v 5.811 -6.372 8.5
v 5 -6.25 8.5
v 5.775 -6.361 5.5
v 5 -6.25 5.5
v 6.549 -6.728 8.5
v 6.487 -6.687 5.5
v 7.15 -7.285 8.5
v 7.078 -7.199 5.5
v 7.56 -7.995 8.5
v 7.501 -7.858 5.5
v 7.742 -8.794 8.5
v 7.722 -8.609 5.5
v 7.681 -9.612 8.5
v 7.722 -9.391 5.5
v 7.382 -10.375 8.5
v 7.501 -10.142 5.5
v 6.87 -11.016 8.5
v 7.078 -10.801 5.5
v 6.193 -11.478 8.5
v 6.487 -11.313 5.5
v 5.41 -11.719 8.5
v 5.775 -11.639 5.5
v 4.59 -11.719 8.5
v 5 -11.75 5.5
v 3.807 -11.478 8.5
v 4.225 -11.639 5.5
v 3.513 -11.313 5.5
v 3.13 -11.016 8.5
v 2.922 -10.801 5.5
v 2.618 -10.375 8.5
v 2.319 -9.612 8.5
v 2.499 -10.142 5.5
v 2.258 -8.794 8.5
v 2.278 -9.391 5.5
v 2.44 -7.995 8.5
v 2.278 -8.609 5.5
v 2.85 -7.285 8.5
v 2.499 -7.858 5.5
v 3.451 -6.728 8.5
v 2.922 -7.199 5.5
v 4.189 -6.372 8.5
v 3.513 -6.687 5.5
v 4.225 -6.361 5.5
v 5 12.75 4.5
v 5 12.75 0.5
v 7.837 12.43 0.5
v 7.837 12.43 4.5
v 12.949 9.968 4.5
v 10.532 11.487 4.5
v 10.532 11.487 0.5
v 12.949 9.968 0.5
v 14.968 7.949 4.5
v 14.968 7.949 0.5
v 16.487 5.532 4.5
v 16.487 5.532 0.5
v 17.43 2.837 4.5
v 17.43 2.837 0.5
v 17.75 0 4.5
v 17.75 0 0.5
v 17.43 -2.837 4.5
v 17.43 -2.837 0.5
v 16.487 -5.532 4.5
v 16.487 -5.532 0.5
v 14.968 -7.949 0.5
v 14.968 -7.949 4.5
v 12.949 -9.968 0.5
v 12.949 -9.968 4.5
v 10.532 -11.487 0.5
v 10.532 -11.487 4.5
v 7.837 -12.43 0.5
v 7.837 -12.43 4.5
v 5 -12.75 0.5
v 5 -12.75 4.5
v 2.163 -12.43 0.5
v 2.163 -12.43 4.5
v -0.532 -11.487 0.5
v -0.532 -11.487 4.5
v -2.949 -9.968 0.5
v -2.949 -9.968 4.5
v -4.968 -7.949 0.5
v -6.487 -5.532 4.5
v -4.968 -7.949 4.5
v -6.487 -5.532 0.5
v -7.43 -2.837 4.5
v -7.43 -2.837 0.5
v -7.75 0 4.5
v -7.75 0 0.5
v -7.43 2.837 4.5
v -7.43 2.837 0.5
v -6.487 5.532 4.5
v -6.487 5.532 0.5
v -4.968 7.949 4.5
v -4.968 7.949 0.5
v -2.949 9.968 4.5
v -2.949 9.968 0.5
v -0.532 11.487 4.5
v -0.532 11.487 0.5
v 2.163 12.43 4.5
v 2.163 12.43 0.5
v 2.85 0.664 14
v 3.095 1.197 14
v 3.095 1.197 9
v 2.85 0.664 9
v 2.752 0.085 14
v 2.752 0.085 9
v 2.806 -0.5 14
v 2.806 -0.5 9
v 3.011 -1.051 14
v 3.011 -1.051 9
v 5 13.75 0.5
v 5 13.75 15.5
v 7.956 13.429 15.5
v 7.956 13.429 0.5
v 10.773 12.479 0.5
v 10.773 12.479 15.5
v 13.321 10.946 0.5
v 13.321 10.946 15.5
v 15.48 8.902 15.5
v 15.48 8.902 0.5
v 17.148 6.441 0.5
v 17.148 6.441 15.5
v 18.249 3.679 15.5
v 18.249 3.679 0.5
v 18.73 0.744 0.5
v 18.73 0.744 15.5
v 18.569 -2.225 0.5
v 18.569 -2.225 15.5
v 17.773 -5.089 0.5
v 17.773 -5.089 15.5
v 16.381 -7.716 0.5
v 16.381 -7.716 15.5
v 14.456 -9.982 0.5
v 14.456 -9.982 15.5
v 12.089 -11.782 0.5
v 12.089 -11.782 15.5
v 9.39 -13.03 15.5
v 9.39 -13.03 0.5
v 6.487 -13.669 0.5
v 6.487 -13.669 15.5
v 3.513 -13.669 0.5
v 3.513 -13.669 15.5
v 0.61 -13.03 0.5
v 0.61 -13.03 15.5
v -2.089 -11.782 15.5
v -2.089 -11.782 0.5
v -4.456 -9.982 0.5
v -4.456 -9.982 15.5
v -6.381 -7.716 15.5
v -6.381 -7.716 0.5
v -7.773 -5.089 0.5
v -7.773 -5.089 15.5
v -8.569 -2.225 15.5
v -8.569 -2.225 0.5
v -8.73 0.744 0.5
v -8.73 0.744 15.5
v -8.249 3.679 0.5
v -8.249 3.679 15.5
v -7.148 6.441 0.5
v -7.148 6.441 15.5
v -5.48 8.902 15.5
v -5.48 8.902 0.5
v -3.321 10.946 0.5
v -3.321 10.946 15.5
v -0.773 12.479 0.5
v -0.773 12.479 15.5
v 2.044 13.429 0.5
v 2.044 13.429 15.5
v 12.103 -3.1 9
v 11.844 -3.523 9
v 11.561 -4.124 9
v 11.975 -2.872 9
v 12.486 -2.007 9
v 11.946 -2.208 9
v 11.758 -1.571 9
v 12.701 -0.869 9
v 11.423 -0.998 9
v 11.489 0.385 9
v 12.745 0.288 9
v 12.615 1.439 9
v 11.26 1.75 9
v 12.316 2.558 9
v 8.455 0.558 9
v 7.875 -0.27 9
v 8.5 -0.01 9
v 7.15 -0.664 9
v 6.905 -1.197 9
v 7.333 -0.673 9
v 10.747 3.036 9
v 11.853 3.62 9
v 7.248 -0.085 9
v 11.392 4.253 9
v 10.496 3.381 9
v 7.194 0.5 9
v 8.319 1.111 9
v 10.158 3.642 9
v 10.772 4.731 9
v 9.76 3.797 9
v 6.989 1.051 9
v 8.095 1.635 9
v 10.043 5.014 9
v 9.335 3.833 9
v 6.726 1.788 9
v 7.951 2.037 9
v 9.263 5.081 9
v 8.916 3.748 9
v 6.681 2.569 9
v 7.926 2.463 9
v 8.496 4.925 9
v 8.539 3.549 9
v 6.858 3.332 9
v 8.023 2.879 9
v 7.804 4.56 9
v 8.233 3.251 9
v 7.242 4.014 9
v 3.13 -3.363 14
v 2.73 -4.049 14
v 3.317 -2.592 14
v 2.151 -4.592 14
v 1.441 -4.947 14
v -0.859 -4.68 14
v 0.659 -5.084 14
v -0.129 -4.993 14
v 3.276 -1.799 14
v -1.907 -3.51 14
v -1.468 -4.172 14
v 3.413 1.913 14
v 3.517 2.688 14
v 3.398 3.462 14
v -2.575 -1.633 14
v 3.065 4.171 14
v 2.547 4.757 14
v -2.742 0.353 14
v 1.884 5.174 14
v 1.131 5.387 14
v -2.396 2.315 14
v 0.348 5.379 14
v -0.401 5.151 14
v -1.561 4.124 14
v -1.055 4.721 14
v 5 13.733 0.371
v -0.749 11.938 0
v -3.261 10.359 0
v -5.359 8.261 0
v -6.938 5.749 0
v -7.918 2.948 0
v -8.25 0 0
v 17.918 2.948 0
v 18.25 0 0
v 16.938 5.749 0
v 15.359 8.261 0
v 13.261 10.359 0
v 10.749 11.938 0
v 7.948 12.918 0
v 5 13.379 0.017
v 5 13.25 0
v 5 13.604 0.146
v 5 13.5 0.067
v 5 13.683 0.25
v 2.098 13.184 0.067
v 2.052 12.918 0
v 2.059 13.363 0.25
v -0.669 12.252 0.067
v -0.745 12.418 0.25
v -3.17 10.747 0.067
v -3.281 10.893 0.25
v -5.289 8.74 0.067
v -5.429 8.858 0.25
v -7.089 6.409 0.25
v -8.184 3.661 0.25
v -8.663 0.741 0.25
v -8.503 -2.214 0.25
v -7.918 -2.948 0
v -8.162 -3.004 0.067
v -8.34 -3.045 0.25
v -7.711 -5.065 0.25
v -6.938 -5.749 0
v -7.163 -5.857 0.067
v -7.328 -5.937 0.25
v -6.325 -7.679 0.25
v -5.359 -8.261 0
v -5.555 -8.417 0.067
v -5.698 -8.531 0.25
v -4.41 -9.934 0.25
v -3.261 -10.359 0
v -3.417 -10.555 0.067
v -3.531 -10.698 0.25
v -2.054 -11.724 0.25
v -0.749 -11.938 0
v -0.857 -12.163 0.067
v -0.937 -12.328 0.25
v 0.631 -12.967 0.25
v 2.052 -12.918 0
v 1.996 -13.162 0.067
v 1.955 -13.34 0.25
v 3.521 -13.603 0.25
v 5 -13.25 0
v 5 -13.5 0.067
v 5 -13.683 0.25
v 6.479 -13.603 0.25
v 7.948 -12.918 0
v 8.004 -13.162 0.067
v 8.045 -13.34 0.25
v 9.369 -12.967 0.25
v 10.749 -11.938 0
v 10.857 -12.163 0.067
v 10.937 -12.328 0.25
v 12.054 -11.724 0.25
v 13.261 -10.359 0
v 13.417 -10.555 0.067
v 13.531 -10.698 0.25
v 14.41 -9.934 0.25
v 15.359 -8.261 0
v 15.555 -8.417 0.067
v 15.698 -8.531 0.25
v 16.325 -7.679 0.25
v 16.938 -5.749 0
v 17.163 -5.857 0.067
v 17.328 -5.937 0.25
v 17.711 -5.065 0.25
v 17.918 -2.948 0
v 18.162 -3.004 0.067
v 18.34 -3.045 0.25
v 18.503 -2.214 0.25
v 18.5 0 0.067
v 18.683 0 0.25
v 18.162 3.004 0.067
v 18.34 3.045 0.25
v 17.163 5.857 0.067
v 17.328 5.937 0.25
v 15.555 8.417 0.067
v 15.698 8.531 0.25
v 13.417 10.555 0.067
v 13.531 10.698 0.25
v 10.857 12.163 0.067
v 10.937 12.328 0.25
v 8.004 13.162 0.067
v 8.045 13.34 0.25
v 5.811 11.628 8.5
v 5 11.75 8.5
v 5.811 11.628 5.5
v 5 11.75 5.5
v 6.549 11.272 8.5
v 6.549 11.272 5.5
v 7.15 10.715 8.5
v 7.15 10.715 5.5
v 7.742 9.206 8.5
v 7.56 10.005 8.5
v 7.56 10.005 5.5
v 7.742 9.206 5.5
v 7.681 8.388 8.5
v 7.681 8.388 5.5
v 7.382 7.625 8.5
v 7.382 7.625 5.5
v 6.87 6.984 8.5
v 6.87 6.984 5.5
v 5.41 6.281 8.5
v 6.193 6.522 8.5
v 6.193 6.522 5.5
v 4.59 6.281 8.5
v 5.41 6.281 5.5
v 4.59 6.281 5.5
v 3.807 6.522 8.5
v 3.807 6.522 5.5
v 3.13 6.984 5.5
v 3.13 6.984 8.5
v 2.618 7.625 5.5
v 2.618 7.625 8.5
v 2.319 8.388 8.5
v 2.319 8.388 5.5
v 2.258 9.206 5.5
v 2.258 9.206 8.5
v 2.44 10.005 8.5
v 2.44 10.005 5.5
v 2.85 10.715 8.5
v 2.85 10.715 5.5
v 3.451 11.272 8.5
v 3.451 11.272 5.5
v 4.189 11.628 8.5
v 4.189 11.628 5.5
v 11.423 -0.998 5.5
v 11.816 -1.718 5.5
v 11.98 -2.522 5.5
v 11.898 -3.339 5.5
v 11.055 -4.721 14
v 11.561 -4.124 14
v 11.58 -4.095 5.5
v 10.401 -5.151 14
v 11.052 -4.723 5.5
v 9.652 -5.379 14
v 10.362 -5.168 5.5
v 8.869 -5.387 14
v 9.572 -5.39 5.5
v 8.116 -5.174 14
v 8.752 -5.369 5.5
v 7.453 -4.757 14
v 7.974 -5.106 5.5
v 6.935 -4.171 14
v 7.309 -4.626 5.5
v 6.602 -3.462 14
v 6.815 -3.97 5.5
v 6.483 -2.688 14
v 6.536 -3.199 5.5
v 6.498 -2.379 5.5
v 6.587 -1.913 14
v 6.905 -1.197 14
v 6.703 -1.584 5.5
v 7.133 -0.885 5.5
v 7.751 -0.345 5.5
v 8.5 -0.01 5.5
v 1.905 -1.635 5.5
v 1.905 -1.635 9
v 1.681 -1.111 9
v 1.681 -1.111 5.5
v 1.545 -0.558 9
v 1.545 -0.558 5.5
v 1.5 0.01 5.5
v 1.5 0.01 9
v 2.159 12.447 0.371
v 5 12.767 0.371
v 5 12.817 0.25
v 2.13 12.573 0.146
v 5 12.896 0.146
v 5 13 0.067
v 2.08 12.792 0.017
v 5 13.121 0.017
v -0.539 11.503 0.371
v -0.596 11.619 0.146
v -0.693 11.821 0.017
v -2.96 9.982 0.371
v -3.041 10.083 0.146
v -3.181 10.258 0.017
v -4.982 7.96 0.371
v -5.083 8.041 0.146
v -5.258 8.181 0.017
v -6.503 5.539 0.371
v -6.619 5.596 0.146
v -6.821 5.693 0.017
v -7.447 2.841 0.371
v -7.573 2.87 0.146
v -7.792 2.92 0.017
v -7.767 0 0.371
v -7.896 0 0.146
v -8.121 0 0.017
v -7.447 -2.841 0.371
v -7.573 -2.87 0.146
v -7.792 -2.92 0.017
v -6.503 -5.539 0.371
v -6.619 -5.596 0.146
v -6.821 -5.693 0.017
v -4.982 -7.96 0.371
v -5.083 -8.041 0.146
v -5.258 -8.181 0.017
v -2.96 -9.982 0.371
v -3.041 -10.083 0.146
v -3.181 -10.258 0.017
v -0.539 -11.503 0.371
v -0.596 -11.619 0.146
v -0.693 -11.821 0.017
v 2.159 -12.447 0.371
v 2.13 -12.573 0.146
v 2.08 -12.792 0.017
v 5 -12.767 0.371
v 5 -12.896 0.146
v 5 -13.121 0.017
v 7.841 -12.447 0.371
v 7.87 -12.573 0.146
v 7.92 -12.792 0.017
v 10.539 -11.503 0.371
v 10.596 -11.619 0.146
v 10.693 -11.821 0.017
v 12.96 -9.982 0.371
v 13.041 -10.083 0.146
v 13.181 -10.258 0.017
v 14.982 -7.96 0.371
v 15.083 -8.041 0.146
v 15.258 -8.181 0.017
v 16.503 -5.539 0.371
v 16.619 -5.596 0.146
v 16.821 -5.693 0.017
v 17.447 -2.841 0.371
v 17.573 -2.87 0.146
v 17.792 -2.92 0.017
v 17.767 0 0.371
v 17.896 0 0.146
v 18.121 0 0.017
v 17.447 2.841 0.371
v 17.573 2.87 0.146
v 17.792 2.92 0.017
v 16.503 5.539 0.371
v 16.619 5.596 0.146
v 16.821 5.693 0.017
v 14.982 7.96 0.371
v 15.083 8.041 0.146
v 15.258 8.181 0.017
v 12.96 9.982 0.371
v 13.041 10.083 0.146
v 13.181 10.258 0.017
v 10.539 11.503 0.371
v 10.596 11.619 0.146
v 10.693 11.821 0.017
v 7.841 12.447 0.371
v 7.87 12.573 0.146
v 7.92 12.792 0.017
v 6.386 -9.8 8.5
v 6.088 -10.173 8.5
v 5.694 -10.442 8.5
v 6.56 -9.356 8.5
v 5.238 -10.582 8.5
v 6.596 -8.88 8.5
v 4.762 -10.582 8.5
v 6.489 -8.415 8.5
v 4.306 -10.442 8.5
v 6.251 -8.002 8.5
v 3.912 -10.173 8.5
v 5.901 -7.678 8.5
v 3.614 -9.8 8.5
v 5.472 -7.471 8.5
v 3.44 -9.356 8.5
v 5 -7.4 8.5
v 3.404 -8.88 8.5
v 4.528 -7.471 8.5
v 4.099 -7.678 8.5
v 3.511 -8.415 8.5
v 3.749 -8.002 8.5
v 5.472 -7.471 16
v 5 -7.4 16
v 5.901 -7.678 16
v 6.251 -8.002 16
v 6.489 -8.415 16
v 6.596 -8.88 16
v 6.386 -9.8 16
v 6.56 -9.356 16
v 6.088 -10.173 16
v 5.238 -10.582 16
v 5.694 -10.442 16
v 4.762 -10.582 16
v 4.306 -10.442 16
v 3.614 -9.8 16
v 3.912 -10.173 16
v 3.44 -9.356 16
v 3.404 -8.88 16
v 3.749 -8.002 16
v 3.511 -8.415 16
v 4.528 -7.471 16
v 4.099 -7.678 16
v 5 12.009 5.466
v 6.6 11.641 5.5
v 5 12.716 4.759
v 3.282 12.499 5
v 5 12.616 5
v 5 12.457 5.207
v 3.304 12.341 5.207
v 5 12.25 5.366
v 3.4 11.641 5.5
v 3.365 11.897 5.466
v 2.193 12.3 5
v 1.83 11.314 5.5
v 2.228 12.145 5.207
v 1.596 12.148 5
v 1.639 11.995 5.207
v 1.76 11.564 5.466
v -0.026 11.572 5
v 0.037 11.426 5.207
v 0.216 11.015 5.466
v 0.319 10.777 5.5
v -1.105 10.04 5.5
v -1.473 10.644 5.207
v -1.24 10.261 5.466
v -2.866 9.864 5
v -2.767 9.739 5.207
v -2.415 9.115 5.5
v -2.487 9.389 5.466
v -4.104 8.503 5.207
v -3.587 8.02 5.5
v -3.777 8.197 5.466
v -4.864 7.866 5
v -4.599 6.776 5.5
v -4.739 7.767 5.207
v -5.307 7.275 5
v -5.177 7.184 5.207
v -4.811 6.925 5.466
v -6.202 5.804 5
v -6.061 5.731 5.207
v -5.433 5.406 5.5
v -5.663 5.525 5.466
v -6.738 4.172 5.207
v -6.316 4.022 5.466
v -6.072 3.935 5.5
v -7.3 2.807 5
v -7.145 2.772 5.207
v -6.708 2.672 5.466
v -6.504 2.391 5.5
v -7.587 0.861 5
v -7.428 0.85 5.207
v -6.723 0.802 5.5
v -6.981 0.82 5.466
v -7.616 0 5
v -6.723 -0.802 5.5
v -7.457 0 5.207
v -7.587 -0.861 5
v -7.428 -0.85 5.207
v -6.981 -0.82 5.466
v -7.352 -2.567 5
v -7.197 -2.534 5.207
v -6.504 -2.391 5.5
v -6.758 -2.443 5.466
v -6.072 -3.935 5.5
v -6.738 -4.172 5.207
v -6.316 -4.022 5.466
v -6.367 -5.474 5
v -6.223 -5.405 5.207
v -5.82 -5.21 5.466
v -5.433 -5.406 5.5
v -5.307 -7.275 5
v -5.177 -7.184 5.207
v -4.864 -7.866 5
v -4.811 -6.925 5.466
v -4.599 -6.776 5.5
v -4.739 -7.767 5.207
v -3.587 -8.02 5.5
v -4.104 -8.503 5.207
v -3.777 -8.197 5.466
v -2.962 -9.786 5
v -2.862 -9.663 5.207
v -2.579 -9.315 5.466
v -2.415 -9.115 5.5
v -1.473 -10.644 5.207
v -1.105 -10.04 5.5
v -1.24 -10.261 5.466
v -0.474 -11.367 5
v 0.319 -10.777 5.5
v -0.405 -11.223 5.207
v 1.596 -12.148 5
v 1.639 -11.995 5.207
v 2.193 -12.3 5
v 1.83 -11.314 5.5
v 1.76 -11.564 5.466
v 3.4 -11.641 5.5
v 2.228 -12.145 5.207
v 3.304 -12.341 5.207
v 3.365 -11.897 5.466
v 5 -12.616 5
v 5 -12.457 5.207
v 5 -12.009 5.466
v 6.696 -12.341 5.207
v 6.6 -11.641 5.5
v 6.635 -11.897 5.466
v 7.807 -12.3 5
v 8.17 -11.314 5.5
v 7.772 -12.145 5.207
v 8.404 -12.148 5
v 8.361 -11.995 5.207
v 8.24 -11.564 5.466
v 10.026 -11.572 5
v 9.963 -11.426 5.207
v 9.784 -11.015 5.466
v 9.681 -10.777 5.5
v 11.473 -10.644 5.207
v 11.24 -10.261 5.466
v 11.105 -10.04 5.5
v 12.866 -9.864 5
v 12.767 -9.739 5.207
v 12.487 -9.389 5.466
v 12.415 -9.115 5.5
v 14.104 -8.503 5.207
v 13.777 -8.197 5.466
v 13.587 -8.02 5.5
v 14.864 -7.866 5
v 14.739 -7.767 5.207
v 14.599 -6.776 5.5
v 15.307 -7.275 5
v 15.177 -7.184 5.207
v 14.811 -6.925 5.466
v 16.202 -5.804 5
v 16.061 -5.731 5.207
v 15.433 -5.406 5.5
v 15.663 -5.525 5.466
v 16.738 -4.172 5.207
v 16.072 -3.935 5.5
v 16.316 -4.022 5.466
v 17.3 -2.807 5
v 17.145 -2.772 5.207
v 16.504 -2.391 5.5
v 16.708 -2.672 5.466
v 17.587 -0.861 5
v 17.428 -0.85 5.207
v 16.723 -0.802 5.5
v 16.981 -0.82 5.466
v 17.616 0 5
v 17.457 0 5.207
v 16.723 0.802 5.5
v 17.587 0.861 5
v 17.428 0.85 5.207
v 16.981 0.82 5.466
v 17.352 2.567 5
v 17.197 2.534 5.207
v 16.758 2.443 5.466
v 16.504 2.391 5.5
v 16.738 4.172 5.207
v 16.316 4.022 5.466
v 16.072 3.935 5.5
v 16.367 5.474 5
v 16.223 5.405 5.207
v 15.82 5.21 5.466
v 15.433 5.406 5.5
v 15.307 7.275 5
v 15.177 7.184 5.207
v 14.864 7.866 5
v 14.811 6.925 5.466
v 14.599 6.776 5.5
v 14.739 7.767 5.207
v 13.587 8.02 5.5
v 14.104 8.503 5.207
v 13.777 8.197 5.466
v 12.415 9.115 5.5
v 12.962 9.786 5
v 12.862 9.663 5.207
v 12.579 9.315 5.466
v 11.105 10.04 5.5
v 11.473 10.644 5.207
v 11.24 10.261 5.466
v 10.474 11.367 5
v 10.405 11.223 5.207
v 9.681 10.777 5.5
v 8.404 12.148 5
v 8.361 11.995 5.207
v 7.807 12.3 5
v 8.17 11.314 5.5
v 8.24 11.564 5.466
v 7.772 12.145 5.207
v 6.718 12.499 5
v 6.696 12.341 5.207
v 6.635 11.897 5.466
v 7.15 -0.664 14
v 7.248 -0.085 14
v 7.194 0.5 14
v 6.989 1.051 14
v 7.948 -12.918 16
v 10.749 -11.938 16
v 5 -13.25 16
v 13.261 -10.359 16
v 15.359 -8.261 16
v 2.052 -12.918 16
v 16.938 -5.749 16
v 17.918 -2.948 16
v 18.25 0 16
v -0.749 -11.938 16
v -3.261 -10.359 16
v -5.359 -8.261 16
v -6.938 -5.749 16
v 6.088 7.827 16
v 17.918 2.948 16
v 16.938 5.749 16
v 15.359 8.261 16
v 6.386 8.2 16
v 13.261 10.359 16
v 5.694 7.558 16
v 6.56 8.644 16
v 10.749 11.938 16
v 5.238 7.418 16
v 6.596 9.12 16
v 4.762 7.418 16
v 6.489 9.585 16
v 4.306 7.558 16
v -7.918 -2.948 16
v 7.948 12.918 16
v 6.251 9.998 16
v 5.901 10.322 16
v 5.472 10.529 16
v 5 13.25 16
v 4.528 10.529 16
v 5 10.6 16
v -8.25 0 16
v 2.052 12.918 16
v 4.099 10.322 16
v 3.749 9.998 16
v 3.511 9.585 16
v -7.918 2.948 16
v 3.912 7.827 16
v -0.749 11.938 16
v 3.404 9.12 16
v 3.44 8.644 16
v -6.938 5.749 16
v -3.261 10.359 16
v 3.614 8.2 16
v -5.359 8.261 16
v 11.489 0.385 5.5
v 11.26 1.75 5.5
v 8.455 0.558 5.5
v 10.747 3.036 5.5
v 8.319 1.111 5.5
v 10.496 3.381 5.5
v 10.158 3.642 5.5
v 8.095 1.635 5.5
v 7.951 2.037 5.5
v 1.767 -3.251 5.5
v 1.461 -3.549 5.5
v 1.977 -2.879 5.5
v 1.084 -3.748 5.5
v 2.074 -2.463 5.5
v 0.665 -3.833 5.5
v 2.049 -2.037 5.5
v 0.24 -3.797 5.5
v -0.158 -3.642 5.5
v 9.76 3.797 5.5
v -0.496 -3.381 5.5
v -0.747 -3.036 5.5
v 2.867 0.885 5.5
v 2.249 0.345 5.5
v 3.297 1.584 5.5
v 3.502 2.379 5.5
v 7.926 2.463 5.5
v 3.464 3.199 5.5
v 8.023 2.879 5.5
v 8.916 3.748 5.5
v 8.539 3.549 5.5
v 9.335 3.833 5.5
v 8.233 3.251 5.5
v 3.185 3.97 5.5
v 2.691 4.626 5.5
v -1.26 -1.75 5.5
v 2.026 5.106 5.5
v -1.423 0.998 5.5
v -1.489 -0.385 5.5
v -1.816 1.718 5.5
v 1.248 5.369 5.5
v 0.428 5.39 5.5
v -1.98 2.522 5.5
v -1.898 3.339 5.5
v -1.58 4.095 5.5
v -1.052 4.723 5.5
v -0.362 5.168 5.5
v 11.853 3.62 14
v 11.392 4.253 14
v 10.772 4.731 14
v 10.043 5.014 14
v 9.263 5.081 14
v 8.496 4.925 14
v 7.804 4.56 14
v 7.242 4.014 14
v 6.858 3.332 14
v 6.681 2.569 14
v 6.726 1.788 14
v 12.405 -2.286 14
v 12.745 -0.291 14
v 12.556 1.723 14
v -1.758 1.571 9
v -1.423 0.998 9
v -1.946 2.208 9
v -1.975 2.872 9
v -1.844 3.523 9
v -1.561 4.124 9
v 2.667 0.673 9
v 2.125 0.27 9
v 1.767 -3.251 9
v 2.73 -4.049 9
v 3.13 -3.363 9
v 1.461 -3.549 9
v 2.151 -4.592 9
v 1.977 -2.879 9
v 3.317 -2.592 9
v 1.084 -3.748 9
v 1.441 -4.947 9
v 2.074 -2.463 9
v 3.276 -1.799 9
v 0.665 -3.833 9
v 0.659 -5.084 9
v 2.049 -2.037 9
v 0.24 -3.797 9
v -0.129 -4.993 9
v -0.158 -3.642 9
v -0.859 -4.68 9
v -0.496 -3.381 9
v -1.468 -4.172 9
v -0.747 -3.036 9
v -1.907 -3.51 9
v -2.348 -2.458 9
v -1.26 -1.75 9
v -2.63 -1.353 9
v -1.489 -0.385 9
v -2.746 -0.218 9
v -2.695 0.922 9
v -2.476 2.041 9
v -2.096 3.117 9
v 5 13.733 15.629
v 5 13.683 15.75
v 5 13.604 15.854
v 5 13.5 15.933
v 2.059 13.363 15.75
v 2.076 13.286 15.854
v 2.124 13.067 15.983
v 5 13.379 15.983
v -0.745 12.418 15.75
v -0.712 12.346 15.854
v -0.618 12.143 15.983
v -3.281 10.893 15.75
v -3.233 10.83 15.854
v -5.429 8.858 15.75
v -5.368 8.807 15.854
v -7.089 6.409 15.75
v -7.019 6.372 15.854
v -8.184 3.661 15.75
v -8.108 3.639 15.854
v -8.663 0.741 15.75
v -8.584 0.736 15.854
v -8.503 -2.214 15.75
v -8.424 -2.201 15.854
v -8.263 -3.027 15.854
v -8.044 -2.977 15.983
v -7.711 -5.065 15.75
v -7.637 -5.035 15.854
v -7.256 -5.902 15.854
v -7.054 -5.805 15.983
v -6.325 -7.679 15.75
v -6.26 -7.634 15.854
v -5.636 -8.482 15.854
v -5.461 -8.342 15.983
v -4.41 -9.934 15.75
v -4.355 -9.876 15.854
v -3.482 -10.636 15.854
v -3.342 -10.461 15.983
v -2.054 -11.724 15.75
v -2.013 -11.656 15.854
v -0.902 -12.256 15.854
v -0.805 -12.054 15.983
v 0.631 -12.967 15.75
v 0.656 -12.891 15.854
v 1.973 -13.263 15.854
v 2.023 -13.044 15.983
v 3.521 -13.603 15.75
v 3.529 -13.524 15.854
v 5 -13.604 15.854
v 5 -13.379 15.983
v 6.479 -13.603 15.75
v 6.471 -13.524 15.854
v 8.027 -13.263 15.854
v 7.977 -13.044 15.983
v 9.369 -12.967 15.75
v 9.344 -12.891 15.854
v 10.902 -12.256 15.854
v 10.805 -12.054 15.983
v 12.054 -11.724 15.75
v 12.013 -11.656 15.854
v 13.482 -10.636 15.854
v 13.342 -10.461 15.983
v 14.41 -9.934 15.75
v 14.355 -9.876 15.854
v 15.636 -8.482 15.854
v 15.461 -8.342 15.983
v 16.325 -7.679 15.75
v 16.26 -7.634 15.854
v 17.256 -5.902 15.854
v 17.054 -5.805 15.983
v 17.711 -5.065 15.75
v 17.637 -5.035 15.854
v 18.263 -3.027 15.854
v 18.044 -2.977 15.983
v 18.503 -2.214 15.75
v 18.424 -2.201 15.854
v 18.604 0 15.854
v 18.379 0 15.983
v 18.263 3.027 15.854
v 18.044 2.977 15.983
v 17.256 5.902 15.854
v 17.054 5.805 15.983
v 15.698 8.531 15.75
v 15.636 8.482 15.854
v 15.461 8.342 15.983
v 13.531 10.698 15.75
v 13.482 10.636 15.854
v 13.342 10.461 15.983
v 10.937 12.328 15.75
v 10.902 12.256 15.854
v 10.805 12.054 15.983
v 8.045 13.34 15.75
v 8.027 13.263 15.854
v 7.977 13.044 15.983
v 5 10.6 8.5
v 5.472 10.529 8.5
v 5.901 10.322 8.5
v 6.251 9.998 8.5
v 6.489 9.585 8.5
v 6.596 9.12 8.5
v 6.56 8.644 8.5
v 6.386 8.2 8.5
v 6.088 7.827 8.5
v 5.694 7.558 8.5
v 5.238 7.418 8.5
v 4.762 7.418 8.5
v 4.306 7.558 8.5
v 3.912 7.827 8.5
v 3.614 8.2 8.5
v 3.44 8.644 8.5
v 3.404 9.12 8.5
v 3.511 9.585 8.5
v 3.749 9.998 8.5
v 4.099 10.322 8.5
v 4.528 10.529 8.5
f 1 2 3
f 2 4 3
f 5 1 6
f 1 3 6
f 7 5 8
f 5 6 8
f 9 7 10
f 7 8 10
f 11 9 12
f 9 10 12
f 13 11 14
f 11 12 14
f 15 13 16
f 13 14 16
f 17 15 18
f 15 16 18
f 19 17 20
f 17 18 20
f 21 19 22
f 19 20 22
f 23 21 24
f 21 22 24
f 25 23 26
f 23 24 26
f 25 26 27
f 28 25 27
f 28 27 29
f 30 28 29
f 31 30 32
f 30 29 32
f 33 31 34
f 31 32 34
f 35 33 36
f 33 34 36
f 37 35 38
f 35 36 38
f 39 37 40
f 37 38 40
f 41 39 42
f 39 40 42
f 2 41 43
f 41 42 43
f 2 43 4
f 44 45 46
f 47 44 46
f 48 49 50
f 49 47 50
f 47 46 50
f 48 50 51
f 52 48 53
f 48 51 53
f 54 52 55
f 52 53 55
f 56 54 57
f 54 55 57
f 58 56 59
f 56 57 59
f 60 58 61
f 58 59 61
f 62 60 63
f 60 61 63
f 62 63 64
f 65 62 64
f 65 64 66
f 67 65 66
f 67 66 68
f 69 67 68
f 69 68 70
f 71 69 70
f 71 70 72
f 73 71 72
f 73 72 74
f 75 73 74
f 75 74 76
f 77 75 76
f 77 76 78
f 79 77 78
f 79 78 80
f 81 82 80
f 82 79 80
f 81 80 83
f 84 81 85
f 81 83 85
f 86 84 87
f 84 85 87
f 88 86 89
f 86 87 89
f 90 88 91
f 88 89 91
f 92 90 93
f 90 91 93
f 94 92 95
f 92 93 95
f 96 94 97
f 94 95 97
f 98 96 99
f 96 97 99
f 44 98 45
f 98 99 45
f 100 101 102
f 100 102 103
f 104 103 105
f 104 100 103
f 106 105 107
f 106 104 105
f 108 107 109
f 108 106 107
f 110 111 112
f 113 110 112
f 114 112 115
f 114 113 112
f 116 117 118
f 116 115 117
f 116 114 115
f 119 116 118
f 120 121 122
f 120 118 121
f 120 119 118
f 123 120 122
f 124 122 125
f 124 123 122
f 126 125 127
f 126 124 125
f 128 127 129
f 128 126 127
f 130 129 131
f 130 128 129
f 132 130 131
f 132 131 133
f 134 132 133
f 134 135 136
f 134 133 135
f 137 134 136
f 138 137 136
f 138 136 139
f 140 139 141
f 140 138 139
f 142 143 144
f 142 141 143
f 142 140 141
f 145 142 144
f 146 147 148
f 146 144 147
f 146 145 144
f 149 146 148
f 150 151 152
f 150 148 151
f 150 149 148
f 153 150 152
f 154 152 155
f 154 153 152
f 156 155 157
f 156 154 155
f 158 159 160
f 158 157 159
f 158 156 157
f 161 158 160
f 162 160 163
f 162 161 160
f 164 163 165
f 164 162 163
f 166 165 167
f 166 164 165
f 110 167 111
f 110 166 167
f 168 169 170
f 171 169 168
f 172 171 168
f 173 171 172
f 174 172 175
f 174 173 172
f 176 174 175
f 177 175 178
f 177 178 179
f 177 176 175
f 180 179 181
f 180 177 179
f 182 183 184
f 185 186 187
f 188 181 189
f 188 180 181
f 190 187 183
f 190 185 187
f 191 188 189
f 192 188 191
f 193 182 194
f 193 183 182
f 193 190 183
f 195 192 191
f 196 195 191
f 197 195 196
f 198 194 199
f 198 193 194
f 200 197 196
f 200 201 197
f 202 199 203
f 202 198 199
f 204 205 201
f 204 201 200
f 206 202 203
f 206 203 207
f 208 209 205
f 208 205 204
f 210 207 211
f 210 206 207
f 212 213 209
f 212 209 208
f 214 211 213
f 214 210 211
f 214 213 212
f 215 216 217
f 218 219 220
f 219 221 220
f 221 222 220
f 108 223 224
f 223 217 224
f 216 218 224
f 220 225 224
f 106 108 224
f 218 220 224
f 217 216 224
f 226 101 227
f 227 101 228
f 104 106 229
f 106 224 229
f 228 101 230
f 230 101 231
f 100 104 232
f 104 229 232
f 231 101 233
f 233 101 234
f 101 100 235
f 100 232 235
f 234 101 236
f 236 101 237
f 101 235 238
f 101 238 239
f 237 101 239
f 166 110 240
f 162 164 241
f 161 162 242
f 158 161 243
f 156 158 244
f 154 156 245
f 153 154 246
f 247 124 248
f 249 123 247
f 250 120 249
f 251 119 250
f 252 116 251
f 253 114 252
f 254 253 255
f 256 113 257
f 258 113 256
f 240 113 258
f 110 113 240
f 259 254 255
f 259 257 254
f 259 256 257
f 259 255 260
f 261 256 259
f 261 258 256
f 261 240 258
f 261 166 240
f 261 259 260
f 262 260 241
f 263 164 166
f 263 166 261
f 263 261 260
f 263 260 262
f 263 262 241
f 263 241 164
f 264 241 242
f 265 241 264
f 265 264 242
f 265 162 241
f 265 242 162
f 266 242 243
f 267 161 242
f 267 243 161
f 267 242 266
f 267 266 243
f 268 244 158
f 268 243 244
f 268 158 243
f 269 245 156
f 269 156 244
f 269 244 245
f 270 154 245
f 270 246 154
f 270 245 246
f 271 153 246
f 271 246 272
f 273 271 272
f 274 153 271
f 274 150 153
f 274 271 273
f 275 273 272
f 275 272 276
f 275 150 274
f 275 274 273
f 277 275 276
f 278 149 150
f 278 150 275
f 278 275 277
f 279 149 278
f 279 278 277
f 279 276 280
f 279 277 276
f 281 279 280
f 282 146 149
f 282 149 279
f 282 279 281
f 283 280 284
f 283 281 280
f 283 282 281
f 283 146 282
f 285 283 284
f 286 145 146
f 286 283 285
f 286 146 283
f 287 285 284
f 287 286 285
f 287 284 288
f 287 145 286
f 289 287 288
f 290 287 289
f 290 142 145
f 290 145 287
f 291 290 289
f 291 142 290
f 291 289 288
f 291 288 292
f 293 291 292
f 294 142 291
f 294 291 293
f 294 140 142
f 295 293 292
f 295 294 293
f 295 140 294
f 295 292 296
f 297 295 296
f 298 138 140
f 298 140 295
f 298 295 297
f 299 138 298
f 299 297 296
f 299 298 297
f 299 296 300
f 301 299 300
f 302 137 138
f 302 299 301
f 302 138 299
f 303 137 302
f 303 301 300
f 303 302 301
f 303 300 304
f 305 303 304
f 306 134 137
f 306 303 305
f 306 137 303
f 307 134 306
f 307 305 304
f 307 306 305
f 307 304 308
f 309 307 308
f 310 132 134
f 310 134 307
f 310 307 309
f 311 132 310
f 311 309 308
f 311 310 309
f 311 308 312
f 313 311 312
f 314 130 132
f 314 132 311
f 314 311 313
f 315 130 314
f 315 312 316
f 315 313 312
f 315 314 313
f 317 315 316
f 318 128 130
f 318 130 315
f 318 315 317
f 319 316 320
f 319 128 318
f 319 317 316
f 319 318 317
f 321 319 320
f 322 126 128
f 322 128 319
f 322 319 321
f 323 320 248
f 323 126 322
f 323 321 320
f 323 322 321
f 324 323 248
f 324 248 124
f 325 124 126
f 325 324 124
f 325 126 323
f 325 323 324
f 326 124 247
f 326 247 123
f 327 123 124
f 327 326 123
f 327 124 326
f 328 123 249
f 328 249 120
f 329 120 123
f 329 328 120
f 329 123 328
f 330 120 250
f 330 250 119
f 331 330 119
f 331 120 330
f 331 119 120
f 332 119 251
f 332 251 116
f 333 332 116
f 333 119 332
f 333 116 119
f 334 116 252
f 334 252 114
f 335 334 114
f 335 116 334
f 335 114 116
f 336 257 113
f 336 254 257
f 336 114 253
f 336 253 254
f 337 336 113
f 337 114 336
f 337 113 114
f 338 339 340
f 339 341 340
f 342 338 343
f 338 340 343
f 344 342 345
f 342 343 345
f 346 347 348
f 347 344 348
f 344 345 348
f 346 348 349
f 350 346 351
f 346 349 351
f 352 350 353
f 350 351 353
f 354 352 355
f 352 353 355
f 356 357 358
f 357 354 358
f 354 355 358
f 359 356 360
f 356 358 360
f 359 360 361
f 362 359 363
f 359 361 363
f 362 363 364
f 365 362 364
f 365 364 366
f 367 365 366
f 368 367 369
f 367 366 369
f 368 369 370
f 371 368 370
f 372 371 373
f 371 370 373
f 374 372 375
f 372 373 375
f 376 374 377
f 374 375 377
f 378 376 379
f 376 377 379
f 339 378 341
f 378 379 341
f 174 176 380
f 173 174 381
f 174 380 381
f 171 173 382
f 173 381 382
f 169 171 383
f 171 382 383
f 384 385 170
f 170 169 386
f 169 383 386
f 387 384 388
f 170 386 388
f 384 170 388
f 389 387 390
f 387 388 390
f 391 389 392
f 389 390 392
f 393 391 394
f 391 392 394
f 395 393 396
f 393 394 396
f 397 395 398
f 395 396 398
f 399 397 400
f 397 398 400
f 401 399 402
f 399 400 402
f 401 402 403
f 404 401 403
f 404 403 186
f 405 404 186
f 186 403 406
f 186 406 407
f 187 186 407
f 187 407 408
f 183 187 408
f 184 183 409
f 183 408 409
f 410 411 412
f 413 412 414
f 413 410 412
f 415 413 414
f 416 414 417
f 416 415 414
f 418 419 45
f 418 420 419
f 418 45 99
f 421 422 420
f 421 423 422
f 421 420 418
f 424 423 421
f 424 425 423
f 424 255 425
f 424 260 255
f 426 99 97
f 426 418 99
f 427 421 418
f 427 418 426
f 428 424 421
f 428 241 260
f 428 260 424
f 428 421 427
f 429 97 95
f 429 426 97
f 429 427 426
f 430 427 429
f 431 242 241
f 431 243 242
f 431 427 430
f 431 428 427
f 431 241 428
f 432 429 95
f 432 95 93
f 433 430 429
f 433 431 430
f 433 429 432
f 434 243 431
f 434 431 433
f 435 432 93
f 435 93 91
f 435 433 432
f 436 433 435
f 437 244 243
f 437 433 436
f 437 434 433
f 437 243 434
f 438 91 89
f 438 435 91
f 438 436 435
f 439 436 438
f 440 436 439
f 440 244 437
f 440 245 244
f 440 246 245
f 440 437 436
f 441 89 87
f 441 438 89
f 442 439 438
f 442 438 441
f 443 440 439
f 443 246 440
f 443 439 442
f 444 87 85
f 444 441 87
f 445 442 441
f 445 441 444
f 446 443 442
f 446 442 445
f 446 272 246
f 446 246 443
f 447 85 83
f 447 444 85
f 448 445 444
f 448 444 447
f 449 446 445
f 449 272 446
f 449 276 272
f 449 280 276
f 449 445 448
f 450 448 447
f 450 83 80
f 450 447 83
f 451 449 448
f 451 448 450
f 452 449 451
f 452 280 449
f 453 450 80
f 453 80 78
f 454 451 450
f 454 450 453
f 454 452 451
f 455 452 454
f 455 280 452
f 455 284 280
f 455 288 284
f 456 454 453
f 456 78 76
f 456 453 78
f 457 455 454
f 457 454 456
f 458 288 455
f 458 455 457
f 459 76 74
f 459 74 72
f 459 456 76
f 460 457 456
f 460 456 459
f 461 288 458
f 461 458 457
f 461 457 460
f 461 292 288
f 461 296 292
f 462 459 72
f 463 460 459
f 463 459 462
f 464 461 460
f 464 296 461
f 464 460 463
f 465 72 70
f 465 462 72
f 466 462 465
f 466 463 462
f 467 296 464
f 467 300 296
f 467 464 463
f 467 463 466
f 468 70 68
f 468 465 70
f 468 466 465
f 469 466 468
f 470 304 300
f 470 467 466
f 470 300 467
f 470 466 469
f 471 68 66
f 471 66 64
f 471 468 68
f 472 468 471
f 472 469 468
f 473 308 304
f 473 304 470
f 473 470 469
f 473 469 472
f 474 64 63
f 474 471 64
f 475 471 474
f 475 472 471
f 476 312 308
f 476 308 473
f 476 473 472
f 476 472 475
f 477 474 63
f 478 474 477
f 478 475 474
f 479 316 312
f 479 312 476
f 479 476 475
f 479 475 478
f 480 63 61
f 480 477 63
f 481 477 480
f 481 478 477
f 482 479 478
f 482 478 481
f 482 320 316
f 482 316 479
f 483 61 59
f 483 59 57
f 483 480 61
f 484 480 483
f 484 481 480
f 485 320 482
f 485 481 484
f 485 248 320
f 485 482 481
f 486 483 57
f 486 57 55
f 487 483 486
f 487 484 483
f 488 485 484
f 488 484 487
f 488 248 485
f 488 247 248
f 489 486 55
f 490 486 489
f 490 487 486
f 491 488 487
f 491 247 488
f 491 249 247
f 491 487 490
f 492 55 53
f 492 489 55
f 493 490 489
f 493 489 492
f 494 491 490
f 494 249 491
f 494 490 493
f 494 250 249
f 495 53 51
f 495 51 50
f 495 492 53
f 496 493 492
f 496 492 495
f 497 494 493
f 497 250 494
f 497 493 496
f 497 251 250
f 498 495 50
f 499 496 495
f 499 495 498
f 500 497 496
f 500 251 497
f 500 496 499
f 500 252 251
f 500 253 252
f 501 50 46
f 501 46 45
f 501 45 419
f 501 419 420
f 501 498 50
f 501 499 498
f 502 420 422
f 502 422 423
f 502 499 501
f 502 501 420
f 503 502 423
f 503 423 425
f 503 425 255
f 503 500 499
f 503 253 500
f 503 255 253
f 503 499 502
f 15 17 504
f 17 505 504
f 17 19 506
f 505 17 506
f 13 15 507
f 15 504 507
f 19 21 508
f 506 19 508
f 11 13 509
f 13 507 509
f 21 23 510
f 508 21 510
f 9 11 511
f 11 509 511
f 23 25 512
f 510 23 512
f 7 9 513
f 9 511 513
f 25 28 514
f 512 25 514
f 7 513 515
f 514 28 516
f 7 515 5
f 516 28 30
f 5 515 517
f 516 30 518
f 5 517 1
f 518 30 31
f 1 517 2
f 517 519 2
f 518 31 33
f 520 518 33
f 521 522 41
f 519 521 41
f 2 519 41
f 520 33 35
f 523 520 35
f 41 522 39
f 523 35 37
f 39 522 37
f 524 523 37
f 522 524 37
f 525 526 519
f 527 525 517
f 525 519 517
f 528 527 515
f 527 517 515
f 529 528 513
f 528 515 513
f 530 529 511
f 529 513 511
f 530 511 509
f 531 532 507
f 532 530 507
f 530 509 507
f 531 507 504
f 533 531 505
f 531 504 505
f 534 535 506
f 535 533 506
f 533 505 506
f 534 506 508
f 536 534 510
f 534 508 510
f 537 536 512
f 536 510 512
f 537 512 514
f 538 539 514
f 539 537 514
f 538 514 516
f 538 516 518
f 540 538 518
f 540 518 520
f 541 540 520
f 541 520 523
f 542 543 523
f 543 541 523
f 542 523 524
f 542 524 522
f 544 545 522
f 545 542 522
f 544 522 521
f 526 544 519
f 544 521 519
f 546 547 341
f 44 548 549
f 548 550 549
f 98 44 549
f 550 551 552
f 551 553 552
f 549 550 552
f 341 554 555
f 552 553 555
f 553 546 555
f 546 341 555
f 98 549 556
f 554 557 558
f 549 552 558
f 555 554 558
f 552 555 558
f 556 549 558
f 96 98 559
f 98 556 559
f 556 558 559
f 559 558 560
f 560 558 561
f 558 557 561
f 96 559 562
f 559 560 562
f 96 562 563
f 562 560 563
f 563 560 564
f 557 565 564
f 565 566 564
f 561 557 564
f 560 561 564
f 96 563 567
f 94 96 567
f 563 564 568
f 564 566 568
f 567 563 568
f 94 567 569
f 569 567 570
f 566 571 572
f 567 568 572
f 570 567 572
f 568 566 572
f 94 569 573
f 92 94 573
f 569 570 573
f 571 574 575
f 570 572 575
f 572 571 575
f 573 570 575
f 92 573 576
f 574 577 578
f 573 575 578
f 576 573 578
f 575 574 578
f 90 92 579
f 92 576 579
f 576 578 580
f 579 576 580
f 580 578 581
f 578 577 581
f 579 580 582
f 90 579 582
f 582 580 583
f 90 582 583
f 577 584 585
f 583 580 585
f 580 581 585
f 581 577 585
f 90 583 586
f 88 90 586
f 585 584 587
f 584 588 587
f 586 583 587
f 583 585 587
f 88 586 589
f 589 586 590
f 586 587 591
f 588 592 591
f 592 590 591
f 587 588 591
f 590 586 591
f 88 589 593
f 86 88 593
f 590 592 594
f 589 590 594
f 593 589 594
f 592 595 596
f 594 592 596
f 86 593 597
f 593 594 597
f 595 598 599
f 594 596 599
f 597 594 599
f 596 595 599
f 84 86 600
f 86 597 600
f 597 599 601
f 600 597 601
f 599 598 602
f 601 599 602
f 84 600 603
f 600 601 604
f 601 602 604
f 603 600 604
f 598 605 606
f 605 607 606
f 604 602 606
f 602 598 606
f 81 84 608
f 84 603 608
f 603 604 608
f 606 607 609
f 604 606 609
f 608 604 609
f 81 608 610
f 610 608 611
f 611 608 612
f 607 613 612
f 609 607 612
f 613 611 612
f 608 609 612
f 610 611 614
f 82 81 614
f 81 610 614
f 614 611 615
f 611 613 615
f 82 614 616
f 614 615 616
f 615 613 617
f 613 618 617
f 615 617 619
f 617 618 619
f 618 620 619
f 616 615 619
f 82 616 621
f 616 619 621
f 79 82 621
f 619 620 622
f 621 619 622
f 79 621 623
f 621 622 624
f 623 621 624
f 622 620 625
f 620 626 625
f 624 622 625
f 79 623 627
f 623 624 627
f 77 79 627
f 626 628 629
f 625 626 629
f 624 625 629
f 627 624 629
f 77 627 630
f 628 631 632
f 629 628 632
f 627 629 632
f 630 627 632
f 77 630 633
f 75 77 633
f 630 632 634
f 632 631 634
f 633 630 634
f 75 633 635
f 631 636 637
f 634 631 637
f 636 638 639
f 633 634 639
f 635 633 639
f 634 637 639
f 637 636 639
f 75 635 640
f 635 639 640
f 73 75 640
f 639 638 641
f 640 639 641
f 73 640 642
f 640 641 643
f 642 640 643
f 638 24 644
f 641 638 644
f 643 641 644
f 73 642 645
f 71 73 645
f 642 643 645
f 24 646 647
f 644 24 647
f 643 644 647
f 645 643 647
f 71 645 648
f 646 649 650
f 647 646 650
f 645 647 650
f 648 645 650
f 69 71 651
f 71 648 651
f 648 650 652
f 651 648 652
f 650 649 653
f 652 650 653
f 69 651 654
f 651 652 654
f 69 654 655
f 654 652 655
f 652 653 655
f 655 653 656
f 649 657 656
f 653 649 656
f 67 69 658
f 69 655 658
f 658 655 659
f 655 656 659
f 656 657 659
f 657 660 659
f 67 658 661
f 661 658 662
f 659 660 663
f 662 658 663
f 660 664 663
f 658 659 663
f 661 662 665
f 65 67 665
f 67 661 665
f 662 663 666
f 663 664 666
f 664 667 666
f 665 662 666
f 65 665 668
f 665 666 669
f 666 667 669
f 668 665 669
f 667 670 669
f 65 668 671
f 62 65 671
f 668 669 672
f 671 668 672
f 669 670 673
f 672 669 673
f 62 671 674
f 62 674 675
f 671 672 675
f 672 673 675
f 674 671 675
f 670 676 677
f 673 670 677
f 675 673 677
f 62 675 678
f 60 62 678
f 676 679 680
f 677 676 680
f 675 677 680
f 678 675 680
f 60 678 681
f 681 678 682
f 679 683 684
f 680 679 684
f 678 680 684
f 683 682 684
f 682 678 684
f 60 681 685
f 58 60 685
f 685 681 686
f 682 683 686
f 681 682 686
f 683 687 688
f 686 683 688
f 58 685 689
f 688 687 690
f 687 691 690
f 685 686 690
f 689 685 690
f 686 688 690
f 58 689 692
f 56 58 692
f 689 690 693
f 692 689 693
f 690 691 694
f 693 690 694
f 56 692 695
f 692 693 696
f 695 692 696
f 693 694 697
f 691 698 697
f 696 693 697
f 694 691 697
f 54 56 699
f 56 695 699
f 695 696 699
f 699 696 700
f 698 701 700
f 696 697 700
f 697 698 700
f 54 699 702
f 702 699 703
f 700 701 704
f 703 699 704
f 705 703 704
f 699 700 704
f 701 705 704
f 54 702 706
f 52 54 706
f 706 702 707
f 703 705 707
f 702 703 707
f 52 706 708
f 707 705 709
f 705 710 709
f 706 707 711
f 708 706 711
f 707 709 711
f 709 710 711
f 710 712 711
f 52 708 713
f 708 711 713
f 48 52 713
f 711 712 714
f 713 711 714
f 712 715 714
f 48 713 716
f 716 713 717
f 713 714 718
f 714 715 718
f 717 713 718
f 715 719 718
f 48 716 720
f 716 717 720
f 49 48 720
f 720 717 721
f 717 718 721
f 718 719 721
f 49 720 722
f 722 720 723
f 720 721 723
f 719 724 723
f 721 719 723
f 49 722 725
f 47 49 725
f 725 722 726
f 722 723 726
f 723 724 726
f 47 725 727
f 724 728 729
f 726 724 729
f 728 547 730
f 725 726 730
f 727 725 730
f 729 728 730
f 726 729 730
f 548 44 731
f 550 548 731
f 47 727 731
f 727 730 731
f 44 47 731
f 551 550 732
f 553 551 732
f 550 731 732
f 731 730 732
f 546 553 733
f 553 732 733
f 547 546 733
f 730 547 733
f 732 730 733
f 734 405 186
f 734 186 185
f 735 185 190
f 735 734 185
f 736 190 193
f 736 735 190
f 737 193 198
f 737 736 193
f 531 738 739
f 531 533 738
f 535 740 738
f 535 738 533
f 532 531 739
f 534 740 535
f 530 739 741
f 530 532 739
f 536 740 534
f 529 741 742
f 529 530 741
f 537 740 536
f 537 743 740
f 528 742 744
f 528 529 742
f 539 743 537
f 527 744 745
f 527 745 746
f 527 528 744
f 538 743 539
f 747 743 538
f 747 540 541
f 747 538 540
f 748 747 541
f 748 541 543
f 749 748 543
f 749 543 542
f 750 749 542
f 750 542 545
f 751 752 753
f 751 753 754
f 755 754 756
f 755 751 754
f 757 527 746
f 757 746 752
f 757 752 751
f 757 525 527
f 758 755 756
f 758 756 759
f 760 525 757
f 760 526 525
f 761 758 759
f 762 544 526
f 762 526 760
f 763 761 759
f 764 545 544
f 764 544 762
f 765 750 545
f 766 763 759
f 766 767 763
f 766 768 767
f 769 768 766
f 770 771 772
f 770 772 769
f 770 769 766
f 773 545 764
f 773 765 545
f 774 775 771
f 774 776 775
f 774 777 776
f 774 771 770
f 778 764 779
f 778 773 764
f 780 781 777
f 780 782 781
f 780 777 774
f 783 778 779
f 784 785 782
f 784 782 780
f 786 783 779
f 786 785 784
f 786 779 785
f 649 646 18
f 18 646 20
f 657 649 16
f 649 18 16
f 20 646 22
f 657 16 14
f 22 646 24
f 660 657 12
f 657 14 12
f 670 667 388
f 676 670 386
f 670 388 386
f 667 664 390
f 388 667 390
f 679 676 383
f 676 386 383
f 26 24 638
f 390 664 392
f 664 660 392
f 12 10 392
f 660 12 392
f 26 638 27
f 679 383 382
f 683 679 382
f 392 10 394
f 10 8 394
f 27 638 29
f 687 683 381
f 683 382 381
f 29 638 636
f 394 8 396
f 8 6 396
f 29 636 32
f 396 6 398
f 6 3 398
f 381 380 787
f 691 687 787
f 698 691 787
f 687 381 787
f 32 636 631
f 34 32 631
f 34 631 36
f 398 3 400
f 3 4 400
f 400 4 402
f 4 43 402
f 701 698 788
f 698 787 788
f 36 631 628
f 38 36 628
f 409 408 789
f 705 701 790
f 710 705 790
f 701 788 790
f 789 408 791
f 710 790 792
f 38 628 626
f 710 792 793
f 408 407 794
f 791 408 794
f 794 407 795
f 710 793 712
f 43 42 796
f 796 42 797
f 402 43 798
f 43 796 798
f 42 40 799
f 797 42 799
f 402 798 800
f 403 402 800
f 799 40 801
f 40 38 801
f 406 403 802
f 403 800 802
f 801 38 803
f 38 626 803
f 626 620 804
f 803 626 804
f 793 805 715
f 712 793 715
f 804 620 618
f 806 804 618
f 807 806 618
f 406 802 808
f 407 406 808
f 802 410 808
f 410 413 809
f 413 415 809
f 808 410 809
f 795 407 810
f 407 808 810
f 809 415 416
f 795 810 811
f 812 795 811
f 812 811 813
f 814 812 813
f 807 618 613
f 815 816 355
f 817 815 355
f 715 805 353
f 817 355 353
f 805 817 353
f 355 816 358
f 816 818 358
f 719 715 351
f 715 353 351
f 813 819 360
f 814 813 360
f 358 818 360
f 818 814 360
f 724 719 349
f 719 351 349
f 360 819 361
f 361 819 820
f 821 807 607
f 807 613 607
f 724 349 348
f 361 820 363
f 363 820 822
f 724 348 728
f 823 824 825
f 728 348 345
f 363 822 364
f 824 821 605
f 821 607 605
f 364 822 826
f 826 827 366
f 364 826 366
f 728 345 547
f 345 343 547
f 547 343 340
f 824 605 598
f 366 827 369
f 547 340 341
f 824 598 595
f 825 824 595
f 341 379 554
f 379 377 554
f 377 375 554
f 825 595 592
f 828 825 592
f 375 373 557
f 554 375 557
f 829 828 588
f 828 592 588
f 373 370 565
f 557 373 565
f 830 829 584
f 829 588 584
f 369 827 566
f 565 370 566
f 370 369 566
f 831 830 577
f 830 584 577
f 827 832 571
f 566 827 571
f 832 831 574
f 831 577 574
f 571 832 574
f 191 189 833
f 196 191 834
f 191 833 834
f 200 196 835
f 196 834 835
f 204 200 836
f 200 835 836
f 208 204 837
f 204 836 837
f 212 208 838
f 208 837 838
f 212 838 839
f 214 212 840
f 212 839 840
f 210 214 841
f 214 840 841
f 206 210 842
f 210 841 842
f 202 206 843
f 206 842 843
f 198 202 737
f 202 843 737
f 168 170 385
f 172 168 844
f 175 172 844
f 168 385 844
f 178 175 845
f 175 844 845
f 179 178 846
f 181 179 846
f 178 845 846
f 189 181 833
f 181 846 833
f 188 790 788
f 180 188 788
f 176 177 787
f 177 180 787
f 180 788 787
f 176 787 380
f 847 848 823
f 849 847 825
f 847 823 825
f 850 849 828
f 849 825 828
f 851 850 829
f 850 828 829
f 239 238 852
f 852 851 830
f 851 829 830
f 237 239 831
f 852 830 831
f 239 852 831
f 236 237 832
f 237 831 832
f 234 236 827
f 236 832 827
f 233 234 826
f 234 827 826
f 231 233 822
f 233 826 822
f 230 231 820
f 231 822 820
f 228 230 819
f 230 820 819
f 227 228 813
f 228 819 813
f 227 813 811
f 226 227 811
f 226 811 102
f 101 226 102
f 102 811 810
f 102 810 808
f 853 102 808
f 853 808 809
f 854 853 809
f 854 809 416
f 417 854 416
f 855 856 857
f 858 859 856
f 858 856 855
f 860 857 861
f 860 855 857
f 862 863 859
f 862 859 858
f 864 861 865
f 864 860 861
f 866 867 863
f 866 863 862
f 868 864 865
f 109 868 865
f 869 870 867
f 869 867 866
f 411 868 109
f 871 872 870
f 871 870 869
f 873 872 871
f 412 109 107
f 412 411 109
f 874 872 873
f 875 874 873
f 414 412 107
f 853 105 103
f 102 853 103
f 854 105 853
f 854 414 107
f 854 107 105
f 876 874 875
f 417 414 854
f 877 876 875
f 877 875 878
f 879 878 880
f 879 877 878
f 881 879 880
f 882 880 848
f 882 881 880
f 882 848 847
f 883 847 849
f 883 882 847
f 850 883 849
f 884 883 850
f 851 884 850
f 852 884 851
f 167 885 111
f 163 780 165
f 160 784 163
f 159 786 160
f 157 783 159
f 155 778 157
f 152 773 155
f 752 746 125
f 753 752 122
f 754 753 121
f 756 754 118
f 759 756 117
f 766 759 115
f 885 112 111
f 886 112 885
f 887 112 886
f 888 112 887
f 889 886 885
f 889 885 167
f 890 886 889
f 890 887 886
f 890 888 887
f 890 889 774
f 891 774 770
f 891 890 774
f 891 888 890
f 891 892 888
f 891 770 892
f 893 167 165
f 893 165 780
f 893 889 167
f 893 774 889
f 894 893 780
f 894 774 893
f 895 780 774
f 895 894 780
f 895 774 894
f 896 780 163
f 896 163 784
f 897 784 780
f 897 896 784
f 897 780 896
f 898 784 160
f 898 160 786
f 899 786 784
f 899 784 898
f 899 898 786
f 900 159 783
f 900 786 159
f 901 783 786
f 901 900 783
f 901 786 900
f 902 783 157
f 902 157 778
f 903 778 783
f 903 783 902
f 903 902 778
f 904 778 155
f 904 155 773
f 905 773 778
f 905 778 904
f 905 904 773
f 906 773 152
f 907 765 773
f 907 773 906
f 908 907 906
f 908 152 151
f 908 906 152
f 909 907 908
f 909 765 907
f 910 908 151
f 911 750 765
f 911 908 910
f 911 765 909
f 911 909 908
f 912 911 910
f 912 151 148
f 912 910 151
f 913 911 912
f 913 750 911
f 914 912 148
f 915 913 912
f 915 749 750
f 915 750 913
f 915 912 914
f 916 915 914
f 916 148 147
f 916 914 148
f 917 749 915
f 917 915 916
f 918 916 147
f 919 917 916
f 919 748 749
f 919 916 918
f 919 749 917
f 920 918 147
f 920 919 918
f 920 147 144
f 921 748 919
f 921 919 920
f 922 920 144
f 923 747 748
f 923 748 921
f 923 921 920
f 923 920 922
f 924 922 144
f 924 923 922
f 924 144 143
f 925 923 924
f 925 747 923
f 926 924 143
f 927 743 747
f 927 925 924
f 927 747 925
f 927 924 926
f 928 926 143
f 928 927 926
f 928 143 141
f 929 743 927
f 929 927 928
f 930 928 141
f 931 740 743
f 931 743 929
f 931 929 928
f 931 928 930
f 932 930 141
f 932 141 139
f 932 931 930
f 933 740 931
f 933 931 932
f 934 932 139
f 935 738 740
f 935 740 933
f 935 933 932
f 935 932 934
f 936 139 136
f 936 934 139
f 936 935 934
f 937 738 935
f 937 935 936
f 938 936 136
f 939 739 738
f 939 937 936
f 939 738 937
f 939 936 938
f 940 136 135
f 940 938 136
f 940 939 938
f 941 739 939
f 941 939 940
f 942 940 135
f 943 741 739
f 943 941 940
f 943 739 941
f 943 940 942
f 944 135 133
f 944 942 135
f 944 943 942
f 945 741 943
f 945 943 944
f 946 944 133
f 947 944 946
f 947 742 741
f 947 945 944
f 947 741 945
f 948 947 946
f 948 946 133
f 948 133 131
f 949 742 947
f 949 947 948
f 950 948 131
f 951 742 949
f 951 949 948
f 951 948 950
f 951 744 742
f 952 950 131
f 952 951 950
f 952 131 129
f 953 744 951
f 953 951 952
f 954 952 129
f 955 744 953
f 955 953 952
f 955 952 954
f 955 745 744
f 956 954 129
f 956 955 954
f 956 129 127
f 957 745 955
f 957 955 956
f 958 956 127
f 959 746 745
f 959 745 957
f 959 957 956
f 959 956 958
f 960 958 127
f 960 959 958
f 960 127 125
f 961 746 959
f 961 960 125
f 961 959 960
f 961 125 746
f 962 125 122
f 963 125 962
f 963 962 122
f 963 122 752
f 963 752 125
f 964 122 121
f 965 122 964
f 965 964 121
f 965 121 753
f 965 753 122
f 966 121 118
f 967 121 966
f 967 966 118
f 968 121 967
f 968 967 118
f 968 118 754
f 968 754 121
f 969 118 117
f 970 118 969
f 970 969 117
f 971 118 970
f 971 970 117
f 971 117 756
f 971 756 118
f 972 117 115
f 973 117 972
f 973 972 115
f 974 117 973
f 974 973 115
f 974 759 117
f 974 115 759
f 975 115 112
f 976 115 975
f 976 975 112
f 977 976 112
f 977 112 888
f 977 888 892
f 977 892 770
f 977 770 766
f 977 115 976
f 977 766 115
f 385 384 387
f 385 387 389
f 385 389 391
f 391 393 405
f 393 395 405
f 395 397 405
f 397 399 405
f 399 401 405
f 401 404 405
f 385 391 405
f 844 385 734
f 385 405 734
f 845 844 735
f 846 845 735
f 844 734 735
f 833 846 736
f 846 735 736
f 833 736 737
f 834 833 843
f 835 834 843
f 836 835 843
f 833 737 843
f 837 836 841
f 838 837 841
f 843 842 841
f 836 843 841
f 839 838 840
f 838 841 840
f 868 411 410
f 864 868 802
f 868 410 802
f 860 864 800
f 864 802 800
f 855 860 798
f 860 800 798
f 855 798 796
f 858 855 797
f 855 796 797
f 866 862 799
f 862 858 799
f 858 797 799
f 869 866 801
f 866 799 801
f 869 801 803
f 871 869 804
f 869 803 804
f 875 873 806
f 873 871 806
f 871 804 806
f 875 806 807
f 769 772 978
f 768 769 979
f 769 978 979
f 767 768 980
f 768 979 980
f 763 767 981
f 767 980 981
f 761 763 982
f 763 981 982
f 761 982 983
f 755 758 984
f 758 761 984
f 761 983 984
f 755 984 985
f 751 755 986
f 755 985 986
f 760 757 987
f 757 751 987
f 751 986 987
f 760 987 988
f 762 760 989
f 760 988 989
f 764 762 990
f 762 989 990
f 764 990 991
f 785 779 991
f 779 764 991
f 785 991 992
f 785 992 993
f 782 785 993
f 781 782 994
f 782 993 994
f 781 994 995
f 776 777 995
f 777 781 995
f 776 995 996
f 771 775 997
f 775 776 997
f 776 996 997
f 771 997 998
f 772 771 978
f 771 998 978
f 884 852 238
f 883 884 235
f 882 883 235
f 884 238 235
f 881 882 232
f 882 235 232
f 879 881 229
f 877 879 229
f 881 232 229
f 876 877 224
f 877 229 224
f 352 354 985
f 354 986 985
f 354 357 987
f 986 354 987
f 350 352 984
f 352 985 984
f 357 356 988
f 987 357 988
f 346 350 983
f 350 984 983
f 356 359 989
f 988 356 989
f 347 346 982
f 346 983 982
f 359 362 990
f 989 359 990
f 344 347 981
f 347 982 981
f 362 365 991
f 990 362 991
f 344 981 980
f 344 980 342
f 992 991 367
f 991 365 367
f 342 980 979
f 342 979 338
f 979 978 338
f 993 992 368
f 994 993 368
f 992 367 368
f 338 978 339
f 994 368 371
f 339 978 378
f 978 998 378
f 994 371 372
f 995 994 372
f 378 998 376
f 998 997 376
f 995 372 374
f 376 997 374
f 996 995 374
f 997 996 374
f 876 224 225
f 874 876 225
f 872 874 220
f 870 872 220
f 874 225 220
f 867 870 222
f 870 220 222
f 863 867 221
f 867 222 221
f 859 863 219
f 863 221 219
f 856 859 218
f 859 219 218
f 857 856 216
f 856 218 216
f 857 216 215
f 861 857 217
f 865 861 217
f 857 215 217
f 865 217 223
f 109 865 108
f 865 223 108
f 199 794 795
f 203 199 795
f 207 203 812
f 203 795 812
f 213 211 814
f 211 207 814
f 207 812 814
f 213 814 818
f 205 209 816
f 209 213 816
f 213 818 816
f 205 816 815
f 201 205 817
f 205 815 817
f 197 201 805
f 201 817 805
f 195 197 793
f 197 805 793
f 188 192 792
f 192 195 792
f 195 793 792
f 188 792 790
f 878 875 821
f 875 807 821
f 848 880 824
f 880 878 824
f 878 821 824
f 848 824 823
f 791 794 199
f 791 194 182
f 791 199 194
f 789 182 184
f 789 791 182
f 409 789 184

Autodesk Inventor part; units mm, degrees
ref_plane "YZ Plane" through (0, 0, 0) normal (1, 0, 0) x (0, 1, 0)
ref_plane "XZ Plane" through (0, 0, 0) normal (0, 1, 0) x (-1, 0, 0)
ref_plane "XY Plane" through (0, 0, 0) normal (0, 0, 1) x (1, 0, 0)
sketch "Skizze2" plane through (5, 0, 0) normal (0, 0, 1) x (0, 1, 0)
  line L0 (8.038058, 0) -> (-10.166505, 0) construction
  line L1 (0, 30.8) -> (0, -30.8) construction
  line L2 (-70, 0) -> (70, 0) construction
  arc A0 (3.036176, -5.747316) -> (1.634864, -3.094708) centre (2.33552, -4.421012) ccw
  arc A1 (-3.036176, 5.747316) -> (-1.634864, 3.094708) centre (-2.33552, 4.421012) ccw
  line L3 (-0.006109, 0) -> (9.613184, 0) construction
  line L4 (-0.006109, 0) -> (-9.625402, 0) construction
  circle A2 centre (0, 0) radius 5 construction
  line L5 (-2.33552, 4.421012) -> (2.33552, -4.421012) construction
  line L6 (-6.186265, -9.841316) -> (6.420655, 10.214191) construction
  arc A3 (-0.010476, -3.499984) -> (-0.997533, -6.423) centre (-2.660949, -4.233126) ccw
  arc A4 (0.010476, 3.499984) -> (0.997533, 6.423) centre (2.660949, 4.233126) ccw
  arc A5 (-10.500103, 0) -> (-10.500103, 0) centre (0, 0) ccw
  arc A6 (10.499894, 0) -> (10.499894, 0) centre (0, 0) ccw
  arc A7 (-7.500104, 0) -> (-7.500104, 0) centre (0, 0) ccw
  arc A8 (7.499894, 0) -> (7.499894, 0) centre (0, 0) ccw
  arc A9 (-0.010476, -3.499984) -> (1.634864, -3.094708) centre (0, 0) ccw
  arc A10 (-0.997533, -6.423) -> (3.036176, -5.747316) centre (0, 0) ccw
  arc A11 (0.010476, 3.499984) -> (-1.634864, 3.094708) centre (0, 0) ccw
  arc A12 (0.997533, 6.423) -> (-3.036176, 5.747316) centre (0, 0) ccw
  circle A13 centre (0, 0) radius 13.75
  circle A14 centre (0, 0) radius 12.75
  circle A15 centre (0, 0) radius 9 construction
  circle A16 centre (-9, 0) radius 1.6
  circle A17 centre (9, 0) radius 1.6
  arc A18 (-4.124471, -6.561345) -> (3.620056, -6.852569) centre (0, 0) ccw
  arc A19 (-3.510441, 6.907387) -> (-1.050984, 1.989455) centre (-2.33552, 4.421012) ccw
  arc A20 (3.620056, -6.852569) -> (1.050984, -1.989455) centre (2.33552, -4.421012) ccw
  arc A21 (-1.197427, -1.904906) -> (1.050984, -1.989455) centre (0, 0) ccw
  arc A22 (1.197427, 1.904906) -> (-1.050984, 1.989455) centre (0, 0) ccw
  arc A23 (4.124471, 6.561345) -> (-3.510441, 6.907387) centre (0.001927, 0.003066) ccw
  circle A24 centre (-9, 0) radius 2.75
  circle A25 centre (9, 0) radius 2.75
  dimension "d3" = 3
  dimension "d4" = 3
  dimension "d57" = 10
  dimension "d67" = 152.154
  dimension "d215" = 5.5
  dimension "d216" = 60
  dimension "d218" = 27.5
  dimension "d219" = 1
  dimension "d227" = 18
  dimension "d228" = 3.2
  dimension "d235" = 5.5
extrude "Extrusion15" add sketch "Skizze2" along normal blind 16 contours A10 A3 A7 A9 A0 | A0 A9 A3 A21 A20 A7 A10 | A7 A20 A18 A3 | A3 A7 | A3 A7 A24 A19 A22 A4 A25 A20 A21 | A18 A20 A7 A25 A5 A24 A3 | A24 A5 A16 A7 | A7 A16 A24 | A25 A7 A17 | A7 A17 A5 A25 | A24 A5 A16 | A25 A5 A17 A7 | A7 A4 A23 A19 A24 A5 A25 | A5 A17 A25 | A16 A5 A24 A7 | A7 A4 | A4 A11 A1 A12 A7 | A19 A23 A4 A7 | A7 A4 A12 A1 A11 A22 A19 | A13 | A14
extrude "Extrusion16" cut sketch "Skizze2" along normal blind 5.5 contours A10 A3 A7 A9 A0 | A0 A9 A3 A21 A20 A7 A10 | A7 A20 A18 A3 | A3 A7 | A3 A7 A24 A19 A22 A4 A25 A20 A21 | A18 A20 A7 A25 A5 A24 A3 | A24 A5 A16 A7 | A7 A16 A24 | A25 A7 A17 | A7 A17 A5 A25 | A16 A5 A7 | A7 A16 | A24 A5 A16 | A17 A7 | A7 A17 A5 | A25 A5 A17 A7 | A7 A4 A23 A19 A24 A5 A25 | A5 A17 A25 | A16 A5 A24 A7 | A16 A5 | A5 A17 | A7 A4 | A4 A11 A1 A12 A7 | A19 A23 A4 A7 | A7 A4 A12 A1 A11 A22 A19 | A14
extrude "Extrusion17" cut sketch "Skizze2" along normal blind 14 contours A10 A3 A7 A9 A0 | A3 A7 | A7 A4 | A4 A11 A1 A12 A7
extrude "Extrusion19" cut sketch "Skizze2" against normal blind 5 from surface at 14 contours A0 A9 A3 A21 A20 A7 A10 | A7 A20 A18 A3 | A19 A23 A4 A7 | A7 A4 A12 A1 A11 A22 A19
extrude "Extrusion20" cut sketch "Skizze2" along normal blind 3 from surface at 5.5 contours A24 A5 A16 A7 | A7 A16 A24 | A25 A7 A17 | A7 A17 A5 A25 | A24 A5 A16 | A25 A5 A17 A7 | A5 A17 A25 | A16 A5 A24 A7
fillet "Rundung8" radius 1 1 edges at (5, -12.75, 5.5)
fillet "Rundung9" radius 0.5 3 edges at (5, -13.75, 16) (5, -13.75, 0) (5, -12.75, 0)
equation "\"d4\" = d3"
equation "\"d91\" = 60deg"
equation "\"Skizze5_Pitch\" = 2"
equation "\"d111\" = 60deg"
equation "\"Skizze7_Pitch\" = 2"
equation "\"d129\" = 60deg"
equation "\"Skizze9_Pitch\" = 2"
equation "\"d147\" = 60deg"
equation "\"Skizze11_Pitch\" = 2.5"
equation "\"d165\" = 60deg"
equation "\"Skizze13_Pitch\" = 2"
properties part number "GU10-Socket" material "PC/ABS-Kunststoff"
